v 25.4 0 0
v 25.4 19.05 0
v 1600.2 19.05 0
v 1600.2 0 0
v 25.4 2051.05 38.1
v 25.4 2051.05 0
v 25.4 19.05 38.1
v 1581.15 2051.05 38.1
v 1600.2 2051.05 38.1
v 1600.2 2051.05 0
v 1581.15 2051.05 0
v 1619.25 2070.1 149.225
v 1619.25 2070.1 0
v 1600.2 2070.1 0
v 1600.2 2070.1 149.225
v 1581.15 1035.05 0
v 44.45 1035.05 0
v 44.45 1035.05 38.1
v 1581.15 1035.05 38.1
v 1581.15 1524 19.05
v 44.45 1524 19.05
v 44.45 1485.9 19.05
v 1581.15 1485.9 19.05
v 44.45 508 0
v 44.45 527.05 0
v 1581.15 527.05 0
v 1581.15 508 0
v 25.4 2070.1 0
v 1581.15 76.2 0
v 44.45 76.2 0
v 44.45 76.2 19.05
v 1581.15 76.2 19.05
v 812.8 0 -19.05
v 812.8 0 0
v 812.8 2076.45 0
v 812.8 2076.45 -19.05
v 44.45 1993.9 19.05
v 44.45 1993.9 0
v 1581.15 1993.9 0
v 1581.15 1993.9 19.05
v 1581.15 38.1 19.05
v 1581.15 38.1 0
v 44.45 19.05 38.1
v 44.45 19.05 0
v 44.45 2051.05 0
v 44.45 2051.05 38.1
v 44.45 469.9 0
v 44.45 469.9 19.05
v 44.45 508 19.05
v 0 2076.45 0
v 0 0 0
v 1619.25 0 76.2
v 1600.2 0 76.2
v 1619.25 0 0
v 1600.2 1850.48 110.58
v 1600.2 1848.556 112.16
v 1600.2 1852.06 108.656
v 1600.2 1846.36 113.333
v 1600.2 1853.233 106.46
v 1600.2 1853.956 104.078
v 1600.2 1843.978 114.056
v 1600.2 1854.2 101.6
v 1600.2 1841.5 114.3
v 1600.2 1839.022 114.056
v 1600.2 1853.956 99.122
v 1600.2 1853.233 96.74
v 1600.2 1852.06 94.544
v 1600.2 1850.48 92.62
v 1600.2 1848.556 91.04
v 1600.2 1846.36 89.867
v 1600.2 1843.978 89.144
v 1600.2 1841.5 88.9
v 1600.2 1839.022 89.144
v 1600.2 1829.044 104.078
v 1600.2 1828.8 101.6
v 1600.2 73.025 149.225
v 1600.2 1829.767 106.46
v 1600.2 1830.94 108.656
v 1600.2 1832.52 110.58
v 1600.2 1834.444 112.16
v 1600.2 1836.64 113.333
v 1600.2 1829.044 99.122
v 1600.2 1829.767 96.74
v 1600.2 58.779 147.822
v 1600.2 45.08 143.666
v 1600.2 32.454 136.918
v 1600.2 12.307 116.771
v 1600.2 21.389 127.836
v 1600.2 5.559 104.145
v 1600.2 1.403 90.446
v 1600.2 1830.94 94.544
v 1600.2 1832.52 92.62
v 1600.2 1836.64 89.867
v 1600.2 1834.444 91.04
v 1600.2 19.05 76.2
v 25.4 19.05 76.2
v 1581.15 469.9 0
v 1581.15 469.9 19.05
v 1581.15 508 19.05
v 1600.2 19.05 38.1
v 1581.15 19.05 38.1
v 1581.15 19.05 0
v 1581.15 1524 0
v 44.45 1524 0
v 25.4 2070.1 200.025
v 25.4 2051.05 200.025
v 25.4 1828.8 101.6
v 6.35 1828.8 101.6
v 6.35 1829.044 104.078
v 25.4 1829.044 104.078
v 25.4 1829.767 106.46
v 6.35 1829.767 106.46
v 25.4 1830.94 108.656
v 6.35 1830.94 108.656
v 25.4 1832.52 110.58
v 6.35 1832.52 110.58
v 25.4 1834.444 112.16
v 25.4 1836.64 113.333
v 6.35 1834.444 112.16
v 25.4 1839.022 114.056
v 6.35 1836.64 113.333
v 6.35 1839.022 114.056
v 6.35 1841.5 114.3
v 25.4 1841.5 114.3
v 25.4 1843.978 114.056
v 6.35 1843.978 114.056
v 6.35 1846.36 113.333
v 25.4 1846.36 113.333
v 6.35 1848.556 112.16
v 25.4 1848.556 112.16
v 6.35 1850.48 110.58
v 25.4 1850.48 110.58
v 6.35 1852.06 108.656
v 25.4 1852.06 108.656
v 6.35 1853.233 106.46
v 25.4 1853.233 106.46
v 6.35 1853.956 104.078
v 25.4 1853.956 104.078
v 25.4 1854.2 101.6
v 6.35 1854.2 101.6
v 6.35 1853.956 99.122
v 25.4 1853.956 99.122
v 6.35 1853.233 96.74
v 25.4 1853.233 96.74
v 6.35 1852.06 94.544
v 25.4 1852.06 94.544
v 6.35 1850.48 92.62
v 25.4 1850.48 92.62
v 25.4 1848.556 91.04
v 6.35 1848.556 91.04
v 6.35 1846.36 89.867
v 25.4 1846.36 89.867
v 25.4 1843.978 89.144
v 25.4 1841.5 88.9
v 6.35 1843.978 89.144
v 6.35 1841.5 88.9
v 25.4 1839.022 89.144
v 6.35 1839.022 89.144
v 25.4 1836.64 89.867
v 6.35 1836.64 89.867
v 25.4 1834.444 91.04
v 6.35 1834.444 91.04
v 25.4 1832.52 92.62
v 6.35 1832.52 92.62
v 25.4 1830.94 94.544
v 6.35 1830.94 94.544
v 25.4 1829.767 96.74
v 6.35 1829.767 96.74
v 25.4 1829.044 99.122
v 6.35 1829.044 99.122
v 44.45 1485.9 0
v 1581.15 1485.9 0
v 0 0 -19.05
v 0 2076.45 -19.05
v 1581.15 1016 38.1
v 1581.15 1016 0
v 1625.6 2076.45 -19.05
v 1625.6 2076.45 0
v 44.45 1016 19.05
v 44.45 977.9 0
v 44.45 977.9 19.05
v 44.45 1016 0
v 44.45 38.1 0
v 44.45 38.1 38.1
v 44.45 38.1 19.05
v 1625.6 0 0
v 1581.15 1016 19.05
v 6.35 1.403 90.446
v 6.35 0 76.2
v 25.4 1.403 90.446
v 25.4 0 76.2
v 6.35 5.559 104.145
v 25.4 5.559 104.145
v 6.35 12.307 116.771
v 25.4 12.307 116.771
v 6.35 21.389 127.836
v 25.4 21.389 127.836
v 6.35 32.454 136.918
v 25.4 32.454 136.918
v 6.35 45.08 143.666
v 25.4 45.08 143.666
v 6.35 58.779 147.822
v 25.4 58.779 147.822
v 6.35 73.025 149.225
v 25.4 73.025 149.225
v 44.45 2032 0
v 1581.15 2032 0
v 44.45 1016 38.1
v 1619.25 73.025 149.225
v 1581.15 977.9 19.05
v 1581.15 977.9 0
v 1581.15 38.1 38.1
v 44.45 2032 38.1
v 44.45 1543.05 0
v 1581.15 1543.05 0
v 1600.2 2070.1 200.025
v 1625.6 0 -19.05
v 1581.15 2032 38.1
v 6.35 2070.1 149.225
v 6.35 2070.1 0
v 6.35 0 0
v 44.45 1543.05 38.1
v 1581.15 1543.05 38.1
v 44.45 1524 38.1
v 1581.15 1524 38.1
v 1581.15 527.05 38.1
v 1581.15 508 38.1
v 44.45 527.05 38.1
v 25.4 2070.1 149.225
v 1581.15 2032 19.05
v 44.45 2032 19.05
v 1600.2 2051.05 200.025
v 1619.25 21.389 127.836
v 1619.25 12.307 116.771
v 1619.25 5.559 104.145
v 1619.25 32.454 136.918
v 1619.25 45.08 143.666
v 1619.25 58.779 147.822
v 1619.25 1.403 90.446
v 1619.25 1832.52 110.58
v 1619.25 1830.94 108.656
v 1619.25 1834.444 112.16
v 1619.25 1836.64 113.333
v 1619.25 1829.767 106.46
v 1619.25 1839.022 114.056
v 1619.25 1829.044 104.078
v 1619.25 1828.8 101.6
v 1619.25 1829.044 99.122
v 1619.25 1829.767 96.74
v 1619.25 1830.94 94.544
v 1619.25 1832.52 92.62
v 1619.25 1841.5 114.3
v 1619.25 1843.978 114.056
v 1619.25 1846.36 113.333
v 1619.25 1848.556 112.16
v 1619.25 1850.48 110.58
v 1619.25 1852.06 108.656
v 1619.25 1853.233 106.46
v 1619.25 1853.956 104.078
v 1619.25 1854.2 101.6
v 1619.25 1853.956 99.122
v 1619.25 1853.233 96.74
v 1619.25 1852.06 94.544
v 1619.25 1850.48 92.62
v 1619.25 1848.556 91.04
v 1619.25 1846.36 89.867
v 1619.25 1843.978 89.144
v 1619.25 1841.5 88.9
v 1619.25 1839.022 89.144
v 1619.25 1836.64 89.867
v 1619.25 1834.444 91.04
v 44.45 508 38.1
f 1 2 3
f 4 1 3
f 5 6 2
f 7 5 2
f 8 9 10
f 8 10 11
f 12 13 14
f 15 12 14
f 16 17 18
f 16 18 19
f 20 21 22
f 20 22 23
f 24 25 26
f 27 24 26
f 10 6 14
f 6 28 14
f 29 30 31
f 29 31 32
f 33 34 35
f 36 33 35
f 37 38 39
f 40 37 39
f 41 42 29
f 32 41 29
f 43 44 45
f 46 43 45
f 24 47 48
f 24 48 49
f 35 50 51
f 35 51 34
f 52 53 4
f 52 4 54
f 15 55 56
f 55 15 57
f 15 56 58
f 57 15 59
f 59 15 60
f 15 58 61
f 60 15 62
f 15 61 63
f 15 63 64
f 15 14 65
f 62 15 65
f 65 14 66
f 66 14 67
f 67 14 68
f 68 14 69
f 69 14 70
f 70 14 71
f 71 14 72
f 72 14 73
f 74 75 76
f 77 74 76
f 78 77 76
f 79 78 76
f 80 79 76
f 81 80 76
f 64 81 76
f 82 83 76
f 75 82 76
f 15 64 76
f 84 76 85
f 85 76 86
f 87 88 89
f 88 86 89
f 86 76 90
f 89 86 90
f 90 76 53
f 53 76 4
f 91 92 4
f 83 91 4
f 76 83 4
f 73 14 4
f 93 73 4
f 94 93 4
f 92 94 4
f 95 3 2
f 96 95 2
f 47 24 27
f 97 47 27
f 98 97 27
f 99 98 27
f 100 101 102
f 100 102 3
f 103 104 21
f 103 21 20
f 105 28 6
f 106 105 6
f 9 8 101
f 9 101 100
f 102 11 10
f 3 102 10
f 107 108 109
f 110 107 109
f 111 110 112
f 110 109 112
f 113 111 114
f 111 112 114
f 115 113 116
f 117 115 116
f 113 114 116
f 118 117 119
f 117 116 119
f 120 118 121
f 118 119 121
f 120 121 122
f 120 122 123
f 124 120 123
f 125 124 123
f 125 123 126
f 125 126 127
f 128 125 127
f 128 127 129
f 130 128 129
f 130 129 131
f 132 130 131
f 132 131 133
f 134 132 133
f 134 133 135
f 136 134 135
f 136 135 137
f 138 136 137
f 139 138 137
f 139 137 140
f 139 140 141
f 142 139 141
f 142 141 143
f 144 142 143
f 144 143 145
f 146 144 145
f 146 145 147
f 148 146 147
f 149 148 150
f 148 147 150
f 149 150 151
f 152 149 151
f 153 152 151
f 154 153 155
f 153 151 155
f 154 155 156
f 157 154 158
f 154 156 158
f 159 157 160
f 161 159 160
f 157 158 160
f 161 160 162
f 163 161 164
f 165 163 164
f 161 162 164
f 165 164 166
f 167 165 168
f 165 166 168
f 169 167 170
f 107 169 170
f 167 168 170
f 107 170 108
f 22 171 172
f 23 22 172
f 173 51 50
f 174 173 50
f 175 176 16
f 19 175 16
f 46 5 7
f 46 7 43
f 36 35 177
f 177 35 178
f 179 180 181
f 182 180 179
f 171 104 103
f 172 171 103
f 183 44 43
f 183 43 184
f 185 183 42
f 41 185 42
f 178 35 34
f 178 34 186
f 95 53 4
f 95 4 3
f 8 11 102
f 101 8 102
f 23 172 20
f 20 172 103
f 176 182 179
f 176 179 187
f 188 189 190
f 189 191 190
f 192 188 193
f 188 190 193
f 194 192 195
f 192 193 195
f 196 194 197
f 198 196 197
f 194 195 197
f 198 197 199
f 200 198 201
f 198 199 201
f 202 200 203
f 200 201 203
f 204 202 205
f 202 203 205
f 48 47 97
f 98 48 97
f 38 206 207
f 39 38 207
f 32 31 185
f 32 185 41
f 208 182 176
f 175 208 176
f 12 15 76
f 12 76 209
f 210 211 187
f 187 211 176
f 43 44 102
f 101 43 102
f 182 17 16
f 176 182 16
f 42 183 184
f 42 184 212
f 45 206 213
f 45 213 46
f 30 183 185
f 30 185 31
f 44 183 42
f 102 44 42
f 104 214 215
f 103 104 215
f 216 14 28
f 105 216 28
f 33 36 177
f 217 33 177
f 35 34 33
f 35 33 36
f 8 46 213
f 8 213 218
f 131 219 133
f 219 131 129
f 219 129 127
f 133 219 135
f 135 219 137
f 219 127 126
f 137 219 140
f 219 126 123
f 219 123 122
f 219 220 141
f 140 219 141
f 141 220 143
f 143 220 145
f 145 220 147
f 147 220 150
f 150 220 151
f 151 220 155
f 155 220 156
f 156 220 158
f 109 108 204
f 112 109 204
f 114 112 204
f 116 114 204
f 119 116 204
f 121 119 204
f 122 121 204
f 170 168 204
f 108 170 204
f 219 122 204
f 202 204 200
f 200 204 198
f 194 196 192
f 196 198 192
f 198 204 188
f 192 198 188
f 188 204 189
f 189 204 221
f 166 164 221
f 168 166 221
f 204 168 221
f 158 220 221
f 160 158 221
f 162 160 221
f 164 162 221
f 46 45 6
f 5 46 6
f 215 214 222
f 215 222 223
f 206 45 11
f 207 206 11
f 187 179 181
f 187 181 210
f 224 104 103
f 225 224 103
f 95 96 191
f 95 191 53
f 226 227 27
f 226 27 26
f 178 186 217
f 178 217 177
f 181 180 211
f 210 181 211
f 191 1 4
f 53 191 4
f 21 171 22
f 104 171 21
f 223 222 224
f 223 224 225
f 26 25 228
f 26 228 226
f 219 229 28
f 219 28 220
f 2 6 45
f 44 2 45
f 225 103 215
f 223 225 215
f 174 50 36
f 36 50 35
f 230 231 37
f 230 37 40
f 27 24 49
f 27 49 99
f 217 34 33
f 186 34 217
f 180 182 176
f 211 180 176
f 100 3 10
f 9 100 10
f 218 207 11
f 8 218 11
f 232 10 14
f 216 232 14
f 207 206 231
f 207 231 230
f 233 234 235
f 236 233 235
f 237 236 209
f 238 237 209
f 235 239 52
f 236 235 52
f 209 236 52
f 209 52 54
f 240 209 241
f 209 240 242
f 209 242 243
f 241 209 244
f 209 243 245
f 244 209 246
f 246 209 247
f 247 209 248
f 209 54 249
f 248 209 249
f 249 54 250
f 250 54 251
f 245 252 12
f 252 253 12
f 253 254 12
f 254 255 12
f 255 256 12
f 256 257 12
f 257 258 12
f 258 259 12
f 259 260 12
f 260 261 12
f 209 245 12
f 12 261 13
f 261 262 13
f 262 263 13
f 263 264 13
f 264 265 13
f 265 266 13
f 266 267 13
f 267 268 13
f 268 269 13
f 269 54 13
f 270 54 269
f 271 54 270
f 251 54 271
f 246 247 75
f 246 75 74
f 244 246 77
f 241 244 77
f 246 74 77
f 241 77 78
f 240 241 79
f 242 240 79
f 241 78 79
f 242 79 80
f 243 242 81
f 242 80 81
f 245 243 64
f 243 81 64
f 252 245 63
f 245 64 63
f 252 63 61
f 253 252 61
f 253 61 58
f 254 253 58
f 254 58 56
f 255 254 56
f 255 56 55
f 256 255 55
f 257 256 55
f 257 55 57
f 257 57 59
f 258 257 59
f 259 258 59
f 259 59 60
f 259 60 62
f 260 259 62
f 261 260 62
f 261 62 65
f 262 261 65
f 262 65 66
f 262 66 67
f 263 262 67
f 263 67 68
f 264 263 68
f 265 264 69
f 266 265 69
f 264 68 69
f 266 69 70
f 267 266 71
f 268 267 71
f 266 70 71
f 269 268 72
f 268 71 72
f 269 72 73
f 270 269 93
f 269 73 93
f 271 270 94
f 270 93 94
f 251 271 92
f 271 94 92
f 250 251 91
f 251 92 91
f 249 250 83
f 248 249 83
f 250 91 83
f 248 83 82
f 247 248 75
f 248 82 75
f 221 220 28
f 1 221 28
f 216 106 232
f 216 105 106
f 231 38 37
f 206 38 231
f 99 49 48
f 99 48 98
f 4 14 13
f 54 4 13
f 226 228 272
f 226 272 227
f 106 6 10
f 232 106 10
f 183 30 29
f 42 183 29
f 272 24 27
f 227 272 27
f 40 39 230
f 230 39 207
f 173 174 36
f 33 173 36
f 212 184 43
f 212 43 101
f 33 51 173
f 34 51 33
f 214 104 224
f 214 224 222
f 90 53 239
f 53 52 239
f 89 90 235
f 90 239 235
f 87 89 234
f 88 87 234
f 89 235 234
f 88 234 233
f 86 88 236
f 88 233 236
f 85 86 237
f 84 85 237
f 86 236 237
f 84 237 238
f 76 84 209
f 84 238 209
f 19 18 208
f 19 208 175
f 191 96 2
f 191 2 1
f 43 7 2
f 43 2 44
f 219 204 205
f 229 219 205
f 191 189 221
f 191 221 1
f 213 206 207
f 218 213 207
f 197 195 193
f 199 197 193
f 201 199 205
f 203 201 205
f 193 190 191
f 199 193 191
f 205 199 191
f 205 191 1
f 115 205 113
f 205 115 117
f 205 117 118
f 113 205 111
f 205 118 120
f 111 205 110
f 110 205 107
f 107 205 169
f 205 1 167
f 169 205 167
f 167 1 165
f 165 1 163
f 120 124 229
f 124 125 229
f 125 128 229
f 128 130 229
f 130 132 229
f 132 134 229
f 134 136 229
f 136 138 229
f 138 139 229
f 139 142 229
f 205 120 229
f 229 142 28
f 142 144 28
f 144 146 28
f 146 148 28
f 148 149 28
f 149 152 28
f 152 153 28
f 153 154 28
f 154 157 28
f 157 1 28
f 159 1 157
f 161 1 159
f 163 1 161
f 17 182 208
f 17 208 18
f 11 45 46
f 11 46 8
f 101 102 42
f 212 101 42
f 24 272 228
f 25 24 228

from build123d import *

# Parameters (mm, degrees)
F0_W      = 812.8
F0_H      = 2076.45
F1_DEPTH  = 19.05
F2_DEPTH  = 19.05
F3_W      = 1536.7
F3_H      = 38.1
F4_DEPTH  = 19.05
F3_H_2    = 19.05
F5_DEPTH  = 38.1
F6_DEPTH  = 38.1
F7_DEPTH  = 76.2
F8_DEPTH  = 149.225
F9_DEPTH  = 200.025
F10_R     = 73.025
F11_R     = 12.7
F12_DEPTH = 1619.251


with BuildPart() as f1:
    # F0 (on Top) → F1 (new body)
    with BuildSketch(Plane.XY):
        with Locations((406.4, 1038.225)):
            Rectangle(F0_W, F0_H)
    extrude(amount=-F1_DEPTH)


with BuildPart() as f2:
    # F0 (on Top) → F2 (new body)
    with BuildSketch(Plane.XY):
        with Locations((1219.2, 1038.225)):
            Rectangle(F0_W, F0_H)
    extrude(amount=-F2_DEPTH)


with BuildPart() as f4:
    # F3 (on Top) → F4 (new body)
    with BuildSketch(Plane.XY):
        with Locations((812.8, 2012.95)):
            Rectangle(F3_W, F3_H)
        with Locations((812.8, 1504.95)):
            Rectangle(F3_W, F3_H)
        with Locations((812.8, 996.95)):
            Rectangle(F3_W, F3_H)
        with Locations((812.8, 488.95)):
            Rectangle(F3_W, F3_H)
        with Locations((812.8, 57.15)):
            Rectangle(F3_W, F3_H)
    extrude(amount=F4_DEPTH)


with BuildPart() as f5:
    # F3 (on Top) → F5 (new body)
    with BuildSketch(Plane.XY):
        with Locations((812.8, 2041.525)):
            Rectangle(F3_W, F3_H_2)
        with Locations((812.8, 1533.525)):
            Rectangle(F3_W, F3_H_2)
        with Locations((812.8, 1025.525)):
            Rectangle(F3_W, F3_H_2)
        with Locations((812.8, 517.525)):
            Rectangle(F3_W, F3_H_2)
        with Locations((812.8, 28.575)):
            Rectangle(F3_W, F3_H_2)
    extrude(amount=F5_DEPTH)


with BuildPart() as f6:
    # F3 (on Top) → F6 (new body)
    with BuildSketch(Plane.XY):
        Polygon((44.45, 2032), (44.45, 2051.05), (25.4, 2051.05), (25.4, 19.05), (44.45, 19.05), (44.45, 38.1), (44.45, 76.2), (44.45, 469.9), (44.45, 508), (44.45, 527.05), (44.45, 977.9), (44.45, 1016), (44.45, 1035.05), (44.45, 1485.9), (44.45, 1524), (44.45, 1543.05), (44.45, 1993.9), align=None)
        Polygon((1600.2, 2051.05), (1581.15, 2051.05), (1581.15, 2032), (1581.15, 1993.9), (1581.15, 1543.05), (1581.15, 1524), (1581.15, 1485.9), (1581.15, 1035.05), (1581.15, 1016), (1581.15, 977.9), (1581.15, 527.05), (1581.15, 508), (1581.15, 469.9), (1581.15, 76.2), (1581.15, 38.1), (1581.15, 19.05), (1600.2, 19.05), align=None)
    extrude(amount=F6_DEPTH)


with BuildPart() as f7:
    # F3 (on Top) → F7 (new body)
    with BuildSketch(Plane.XY):
        Polygon((44.45, 19.05), (25.4, 19.05), (25.4, 0), (1600.2, 0), (1600.2, 19.05), (1581.15, 19.05), align=None)
    extrude(amount=F7_DEPTH)


with BuildPart() as f8:
    # F3 (on Top) → F8 (new body)
    with BuildSketch(Plane.XY):
        Polygon((25.4, 19.05), (25.4, 2051.05), (25.4, 2070.1), (6.35, 2070.1), (6.35, 0), (25.4, 0), align=None)
        Polygon((1600.2, 2070.1), (1600.2, 2051.05), (1600.2, 19.05), (1600.2, 0), (1619.25, 0), (1619.25, 2070.1), align=None)
    extrude(amount=F8_DEPTH)

    # F10
    f10_edges = [f8.edges().sort_by_distance(p)[0] for p in [
        (15.875, 0, 149.225),
        (1609.725, 0, 149.225),
    ]]
    fillet(f10_edges, radius=F10_R)

    # F11 (on face) → F12 (cut, through all)
    with BuildSketch(Plane(origin=(6.35, 0, 0), x_dir=(0, -1, 0), z_dir=(-1, 0, 0))):
        with Locations((-1841.5, 101.6)):
            Circle(F11_R)
    extrude(amount=-F12_DEPTH, mode=Mode.SUBTRACT)


with BuildPart() as f9:
    # F3 (on Top) → F9 (new body)
    with BuildSketch(Plane.XY):
        Polygon((25.4, 2051.05), (44.45, 2051.05), (1581.15, 2051.05), (1600.2, 2051.05), (1600.2, 2070.1), (25.4, 2070.1), align=None)
    extrude(amount=F9_DEPTH)


solid = Compound([f1.part, f2.part, f4.part, f5.part, f6.part, f7.part, f8.part, f9.part])
